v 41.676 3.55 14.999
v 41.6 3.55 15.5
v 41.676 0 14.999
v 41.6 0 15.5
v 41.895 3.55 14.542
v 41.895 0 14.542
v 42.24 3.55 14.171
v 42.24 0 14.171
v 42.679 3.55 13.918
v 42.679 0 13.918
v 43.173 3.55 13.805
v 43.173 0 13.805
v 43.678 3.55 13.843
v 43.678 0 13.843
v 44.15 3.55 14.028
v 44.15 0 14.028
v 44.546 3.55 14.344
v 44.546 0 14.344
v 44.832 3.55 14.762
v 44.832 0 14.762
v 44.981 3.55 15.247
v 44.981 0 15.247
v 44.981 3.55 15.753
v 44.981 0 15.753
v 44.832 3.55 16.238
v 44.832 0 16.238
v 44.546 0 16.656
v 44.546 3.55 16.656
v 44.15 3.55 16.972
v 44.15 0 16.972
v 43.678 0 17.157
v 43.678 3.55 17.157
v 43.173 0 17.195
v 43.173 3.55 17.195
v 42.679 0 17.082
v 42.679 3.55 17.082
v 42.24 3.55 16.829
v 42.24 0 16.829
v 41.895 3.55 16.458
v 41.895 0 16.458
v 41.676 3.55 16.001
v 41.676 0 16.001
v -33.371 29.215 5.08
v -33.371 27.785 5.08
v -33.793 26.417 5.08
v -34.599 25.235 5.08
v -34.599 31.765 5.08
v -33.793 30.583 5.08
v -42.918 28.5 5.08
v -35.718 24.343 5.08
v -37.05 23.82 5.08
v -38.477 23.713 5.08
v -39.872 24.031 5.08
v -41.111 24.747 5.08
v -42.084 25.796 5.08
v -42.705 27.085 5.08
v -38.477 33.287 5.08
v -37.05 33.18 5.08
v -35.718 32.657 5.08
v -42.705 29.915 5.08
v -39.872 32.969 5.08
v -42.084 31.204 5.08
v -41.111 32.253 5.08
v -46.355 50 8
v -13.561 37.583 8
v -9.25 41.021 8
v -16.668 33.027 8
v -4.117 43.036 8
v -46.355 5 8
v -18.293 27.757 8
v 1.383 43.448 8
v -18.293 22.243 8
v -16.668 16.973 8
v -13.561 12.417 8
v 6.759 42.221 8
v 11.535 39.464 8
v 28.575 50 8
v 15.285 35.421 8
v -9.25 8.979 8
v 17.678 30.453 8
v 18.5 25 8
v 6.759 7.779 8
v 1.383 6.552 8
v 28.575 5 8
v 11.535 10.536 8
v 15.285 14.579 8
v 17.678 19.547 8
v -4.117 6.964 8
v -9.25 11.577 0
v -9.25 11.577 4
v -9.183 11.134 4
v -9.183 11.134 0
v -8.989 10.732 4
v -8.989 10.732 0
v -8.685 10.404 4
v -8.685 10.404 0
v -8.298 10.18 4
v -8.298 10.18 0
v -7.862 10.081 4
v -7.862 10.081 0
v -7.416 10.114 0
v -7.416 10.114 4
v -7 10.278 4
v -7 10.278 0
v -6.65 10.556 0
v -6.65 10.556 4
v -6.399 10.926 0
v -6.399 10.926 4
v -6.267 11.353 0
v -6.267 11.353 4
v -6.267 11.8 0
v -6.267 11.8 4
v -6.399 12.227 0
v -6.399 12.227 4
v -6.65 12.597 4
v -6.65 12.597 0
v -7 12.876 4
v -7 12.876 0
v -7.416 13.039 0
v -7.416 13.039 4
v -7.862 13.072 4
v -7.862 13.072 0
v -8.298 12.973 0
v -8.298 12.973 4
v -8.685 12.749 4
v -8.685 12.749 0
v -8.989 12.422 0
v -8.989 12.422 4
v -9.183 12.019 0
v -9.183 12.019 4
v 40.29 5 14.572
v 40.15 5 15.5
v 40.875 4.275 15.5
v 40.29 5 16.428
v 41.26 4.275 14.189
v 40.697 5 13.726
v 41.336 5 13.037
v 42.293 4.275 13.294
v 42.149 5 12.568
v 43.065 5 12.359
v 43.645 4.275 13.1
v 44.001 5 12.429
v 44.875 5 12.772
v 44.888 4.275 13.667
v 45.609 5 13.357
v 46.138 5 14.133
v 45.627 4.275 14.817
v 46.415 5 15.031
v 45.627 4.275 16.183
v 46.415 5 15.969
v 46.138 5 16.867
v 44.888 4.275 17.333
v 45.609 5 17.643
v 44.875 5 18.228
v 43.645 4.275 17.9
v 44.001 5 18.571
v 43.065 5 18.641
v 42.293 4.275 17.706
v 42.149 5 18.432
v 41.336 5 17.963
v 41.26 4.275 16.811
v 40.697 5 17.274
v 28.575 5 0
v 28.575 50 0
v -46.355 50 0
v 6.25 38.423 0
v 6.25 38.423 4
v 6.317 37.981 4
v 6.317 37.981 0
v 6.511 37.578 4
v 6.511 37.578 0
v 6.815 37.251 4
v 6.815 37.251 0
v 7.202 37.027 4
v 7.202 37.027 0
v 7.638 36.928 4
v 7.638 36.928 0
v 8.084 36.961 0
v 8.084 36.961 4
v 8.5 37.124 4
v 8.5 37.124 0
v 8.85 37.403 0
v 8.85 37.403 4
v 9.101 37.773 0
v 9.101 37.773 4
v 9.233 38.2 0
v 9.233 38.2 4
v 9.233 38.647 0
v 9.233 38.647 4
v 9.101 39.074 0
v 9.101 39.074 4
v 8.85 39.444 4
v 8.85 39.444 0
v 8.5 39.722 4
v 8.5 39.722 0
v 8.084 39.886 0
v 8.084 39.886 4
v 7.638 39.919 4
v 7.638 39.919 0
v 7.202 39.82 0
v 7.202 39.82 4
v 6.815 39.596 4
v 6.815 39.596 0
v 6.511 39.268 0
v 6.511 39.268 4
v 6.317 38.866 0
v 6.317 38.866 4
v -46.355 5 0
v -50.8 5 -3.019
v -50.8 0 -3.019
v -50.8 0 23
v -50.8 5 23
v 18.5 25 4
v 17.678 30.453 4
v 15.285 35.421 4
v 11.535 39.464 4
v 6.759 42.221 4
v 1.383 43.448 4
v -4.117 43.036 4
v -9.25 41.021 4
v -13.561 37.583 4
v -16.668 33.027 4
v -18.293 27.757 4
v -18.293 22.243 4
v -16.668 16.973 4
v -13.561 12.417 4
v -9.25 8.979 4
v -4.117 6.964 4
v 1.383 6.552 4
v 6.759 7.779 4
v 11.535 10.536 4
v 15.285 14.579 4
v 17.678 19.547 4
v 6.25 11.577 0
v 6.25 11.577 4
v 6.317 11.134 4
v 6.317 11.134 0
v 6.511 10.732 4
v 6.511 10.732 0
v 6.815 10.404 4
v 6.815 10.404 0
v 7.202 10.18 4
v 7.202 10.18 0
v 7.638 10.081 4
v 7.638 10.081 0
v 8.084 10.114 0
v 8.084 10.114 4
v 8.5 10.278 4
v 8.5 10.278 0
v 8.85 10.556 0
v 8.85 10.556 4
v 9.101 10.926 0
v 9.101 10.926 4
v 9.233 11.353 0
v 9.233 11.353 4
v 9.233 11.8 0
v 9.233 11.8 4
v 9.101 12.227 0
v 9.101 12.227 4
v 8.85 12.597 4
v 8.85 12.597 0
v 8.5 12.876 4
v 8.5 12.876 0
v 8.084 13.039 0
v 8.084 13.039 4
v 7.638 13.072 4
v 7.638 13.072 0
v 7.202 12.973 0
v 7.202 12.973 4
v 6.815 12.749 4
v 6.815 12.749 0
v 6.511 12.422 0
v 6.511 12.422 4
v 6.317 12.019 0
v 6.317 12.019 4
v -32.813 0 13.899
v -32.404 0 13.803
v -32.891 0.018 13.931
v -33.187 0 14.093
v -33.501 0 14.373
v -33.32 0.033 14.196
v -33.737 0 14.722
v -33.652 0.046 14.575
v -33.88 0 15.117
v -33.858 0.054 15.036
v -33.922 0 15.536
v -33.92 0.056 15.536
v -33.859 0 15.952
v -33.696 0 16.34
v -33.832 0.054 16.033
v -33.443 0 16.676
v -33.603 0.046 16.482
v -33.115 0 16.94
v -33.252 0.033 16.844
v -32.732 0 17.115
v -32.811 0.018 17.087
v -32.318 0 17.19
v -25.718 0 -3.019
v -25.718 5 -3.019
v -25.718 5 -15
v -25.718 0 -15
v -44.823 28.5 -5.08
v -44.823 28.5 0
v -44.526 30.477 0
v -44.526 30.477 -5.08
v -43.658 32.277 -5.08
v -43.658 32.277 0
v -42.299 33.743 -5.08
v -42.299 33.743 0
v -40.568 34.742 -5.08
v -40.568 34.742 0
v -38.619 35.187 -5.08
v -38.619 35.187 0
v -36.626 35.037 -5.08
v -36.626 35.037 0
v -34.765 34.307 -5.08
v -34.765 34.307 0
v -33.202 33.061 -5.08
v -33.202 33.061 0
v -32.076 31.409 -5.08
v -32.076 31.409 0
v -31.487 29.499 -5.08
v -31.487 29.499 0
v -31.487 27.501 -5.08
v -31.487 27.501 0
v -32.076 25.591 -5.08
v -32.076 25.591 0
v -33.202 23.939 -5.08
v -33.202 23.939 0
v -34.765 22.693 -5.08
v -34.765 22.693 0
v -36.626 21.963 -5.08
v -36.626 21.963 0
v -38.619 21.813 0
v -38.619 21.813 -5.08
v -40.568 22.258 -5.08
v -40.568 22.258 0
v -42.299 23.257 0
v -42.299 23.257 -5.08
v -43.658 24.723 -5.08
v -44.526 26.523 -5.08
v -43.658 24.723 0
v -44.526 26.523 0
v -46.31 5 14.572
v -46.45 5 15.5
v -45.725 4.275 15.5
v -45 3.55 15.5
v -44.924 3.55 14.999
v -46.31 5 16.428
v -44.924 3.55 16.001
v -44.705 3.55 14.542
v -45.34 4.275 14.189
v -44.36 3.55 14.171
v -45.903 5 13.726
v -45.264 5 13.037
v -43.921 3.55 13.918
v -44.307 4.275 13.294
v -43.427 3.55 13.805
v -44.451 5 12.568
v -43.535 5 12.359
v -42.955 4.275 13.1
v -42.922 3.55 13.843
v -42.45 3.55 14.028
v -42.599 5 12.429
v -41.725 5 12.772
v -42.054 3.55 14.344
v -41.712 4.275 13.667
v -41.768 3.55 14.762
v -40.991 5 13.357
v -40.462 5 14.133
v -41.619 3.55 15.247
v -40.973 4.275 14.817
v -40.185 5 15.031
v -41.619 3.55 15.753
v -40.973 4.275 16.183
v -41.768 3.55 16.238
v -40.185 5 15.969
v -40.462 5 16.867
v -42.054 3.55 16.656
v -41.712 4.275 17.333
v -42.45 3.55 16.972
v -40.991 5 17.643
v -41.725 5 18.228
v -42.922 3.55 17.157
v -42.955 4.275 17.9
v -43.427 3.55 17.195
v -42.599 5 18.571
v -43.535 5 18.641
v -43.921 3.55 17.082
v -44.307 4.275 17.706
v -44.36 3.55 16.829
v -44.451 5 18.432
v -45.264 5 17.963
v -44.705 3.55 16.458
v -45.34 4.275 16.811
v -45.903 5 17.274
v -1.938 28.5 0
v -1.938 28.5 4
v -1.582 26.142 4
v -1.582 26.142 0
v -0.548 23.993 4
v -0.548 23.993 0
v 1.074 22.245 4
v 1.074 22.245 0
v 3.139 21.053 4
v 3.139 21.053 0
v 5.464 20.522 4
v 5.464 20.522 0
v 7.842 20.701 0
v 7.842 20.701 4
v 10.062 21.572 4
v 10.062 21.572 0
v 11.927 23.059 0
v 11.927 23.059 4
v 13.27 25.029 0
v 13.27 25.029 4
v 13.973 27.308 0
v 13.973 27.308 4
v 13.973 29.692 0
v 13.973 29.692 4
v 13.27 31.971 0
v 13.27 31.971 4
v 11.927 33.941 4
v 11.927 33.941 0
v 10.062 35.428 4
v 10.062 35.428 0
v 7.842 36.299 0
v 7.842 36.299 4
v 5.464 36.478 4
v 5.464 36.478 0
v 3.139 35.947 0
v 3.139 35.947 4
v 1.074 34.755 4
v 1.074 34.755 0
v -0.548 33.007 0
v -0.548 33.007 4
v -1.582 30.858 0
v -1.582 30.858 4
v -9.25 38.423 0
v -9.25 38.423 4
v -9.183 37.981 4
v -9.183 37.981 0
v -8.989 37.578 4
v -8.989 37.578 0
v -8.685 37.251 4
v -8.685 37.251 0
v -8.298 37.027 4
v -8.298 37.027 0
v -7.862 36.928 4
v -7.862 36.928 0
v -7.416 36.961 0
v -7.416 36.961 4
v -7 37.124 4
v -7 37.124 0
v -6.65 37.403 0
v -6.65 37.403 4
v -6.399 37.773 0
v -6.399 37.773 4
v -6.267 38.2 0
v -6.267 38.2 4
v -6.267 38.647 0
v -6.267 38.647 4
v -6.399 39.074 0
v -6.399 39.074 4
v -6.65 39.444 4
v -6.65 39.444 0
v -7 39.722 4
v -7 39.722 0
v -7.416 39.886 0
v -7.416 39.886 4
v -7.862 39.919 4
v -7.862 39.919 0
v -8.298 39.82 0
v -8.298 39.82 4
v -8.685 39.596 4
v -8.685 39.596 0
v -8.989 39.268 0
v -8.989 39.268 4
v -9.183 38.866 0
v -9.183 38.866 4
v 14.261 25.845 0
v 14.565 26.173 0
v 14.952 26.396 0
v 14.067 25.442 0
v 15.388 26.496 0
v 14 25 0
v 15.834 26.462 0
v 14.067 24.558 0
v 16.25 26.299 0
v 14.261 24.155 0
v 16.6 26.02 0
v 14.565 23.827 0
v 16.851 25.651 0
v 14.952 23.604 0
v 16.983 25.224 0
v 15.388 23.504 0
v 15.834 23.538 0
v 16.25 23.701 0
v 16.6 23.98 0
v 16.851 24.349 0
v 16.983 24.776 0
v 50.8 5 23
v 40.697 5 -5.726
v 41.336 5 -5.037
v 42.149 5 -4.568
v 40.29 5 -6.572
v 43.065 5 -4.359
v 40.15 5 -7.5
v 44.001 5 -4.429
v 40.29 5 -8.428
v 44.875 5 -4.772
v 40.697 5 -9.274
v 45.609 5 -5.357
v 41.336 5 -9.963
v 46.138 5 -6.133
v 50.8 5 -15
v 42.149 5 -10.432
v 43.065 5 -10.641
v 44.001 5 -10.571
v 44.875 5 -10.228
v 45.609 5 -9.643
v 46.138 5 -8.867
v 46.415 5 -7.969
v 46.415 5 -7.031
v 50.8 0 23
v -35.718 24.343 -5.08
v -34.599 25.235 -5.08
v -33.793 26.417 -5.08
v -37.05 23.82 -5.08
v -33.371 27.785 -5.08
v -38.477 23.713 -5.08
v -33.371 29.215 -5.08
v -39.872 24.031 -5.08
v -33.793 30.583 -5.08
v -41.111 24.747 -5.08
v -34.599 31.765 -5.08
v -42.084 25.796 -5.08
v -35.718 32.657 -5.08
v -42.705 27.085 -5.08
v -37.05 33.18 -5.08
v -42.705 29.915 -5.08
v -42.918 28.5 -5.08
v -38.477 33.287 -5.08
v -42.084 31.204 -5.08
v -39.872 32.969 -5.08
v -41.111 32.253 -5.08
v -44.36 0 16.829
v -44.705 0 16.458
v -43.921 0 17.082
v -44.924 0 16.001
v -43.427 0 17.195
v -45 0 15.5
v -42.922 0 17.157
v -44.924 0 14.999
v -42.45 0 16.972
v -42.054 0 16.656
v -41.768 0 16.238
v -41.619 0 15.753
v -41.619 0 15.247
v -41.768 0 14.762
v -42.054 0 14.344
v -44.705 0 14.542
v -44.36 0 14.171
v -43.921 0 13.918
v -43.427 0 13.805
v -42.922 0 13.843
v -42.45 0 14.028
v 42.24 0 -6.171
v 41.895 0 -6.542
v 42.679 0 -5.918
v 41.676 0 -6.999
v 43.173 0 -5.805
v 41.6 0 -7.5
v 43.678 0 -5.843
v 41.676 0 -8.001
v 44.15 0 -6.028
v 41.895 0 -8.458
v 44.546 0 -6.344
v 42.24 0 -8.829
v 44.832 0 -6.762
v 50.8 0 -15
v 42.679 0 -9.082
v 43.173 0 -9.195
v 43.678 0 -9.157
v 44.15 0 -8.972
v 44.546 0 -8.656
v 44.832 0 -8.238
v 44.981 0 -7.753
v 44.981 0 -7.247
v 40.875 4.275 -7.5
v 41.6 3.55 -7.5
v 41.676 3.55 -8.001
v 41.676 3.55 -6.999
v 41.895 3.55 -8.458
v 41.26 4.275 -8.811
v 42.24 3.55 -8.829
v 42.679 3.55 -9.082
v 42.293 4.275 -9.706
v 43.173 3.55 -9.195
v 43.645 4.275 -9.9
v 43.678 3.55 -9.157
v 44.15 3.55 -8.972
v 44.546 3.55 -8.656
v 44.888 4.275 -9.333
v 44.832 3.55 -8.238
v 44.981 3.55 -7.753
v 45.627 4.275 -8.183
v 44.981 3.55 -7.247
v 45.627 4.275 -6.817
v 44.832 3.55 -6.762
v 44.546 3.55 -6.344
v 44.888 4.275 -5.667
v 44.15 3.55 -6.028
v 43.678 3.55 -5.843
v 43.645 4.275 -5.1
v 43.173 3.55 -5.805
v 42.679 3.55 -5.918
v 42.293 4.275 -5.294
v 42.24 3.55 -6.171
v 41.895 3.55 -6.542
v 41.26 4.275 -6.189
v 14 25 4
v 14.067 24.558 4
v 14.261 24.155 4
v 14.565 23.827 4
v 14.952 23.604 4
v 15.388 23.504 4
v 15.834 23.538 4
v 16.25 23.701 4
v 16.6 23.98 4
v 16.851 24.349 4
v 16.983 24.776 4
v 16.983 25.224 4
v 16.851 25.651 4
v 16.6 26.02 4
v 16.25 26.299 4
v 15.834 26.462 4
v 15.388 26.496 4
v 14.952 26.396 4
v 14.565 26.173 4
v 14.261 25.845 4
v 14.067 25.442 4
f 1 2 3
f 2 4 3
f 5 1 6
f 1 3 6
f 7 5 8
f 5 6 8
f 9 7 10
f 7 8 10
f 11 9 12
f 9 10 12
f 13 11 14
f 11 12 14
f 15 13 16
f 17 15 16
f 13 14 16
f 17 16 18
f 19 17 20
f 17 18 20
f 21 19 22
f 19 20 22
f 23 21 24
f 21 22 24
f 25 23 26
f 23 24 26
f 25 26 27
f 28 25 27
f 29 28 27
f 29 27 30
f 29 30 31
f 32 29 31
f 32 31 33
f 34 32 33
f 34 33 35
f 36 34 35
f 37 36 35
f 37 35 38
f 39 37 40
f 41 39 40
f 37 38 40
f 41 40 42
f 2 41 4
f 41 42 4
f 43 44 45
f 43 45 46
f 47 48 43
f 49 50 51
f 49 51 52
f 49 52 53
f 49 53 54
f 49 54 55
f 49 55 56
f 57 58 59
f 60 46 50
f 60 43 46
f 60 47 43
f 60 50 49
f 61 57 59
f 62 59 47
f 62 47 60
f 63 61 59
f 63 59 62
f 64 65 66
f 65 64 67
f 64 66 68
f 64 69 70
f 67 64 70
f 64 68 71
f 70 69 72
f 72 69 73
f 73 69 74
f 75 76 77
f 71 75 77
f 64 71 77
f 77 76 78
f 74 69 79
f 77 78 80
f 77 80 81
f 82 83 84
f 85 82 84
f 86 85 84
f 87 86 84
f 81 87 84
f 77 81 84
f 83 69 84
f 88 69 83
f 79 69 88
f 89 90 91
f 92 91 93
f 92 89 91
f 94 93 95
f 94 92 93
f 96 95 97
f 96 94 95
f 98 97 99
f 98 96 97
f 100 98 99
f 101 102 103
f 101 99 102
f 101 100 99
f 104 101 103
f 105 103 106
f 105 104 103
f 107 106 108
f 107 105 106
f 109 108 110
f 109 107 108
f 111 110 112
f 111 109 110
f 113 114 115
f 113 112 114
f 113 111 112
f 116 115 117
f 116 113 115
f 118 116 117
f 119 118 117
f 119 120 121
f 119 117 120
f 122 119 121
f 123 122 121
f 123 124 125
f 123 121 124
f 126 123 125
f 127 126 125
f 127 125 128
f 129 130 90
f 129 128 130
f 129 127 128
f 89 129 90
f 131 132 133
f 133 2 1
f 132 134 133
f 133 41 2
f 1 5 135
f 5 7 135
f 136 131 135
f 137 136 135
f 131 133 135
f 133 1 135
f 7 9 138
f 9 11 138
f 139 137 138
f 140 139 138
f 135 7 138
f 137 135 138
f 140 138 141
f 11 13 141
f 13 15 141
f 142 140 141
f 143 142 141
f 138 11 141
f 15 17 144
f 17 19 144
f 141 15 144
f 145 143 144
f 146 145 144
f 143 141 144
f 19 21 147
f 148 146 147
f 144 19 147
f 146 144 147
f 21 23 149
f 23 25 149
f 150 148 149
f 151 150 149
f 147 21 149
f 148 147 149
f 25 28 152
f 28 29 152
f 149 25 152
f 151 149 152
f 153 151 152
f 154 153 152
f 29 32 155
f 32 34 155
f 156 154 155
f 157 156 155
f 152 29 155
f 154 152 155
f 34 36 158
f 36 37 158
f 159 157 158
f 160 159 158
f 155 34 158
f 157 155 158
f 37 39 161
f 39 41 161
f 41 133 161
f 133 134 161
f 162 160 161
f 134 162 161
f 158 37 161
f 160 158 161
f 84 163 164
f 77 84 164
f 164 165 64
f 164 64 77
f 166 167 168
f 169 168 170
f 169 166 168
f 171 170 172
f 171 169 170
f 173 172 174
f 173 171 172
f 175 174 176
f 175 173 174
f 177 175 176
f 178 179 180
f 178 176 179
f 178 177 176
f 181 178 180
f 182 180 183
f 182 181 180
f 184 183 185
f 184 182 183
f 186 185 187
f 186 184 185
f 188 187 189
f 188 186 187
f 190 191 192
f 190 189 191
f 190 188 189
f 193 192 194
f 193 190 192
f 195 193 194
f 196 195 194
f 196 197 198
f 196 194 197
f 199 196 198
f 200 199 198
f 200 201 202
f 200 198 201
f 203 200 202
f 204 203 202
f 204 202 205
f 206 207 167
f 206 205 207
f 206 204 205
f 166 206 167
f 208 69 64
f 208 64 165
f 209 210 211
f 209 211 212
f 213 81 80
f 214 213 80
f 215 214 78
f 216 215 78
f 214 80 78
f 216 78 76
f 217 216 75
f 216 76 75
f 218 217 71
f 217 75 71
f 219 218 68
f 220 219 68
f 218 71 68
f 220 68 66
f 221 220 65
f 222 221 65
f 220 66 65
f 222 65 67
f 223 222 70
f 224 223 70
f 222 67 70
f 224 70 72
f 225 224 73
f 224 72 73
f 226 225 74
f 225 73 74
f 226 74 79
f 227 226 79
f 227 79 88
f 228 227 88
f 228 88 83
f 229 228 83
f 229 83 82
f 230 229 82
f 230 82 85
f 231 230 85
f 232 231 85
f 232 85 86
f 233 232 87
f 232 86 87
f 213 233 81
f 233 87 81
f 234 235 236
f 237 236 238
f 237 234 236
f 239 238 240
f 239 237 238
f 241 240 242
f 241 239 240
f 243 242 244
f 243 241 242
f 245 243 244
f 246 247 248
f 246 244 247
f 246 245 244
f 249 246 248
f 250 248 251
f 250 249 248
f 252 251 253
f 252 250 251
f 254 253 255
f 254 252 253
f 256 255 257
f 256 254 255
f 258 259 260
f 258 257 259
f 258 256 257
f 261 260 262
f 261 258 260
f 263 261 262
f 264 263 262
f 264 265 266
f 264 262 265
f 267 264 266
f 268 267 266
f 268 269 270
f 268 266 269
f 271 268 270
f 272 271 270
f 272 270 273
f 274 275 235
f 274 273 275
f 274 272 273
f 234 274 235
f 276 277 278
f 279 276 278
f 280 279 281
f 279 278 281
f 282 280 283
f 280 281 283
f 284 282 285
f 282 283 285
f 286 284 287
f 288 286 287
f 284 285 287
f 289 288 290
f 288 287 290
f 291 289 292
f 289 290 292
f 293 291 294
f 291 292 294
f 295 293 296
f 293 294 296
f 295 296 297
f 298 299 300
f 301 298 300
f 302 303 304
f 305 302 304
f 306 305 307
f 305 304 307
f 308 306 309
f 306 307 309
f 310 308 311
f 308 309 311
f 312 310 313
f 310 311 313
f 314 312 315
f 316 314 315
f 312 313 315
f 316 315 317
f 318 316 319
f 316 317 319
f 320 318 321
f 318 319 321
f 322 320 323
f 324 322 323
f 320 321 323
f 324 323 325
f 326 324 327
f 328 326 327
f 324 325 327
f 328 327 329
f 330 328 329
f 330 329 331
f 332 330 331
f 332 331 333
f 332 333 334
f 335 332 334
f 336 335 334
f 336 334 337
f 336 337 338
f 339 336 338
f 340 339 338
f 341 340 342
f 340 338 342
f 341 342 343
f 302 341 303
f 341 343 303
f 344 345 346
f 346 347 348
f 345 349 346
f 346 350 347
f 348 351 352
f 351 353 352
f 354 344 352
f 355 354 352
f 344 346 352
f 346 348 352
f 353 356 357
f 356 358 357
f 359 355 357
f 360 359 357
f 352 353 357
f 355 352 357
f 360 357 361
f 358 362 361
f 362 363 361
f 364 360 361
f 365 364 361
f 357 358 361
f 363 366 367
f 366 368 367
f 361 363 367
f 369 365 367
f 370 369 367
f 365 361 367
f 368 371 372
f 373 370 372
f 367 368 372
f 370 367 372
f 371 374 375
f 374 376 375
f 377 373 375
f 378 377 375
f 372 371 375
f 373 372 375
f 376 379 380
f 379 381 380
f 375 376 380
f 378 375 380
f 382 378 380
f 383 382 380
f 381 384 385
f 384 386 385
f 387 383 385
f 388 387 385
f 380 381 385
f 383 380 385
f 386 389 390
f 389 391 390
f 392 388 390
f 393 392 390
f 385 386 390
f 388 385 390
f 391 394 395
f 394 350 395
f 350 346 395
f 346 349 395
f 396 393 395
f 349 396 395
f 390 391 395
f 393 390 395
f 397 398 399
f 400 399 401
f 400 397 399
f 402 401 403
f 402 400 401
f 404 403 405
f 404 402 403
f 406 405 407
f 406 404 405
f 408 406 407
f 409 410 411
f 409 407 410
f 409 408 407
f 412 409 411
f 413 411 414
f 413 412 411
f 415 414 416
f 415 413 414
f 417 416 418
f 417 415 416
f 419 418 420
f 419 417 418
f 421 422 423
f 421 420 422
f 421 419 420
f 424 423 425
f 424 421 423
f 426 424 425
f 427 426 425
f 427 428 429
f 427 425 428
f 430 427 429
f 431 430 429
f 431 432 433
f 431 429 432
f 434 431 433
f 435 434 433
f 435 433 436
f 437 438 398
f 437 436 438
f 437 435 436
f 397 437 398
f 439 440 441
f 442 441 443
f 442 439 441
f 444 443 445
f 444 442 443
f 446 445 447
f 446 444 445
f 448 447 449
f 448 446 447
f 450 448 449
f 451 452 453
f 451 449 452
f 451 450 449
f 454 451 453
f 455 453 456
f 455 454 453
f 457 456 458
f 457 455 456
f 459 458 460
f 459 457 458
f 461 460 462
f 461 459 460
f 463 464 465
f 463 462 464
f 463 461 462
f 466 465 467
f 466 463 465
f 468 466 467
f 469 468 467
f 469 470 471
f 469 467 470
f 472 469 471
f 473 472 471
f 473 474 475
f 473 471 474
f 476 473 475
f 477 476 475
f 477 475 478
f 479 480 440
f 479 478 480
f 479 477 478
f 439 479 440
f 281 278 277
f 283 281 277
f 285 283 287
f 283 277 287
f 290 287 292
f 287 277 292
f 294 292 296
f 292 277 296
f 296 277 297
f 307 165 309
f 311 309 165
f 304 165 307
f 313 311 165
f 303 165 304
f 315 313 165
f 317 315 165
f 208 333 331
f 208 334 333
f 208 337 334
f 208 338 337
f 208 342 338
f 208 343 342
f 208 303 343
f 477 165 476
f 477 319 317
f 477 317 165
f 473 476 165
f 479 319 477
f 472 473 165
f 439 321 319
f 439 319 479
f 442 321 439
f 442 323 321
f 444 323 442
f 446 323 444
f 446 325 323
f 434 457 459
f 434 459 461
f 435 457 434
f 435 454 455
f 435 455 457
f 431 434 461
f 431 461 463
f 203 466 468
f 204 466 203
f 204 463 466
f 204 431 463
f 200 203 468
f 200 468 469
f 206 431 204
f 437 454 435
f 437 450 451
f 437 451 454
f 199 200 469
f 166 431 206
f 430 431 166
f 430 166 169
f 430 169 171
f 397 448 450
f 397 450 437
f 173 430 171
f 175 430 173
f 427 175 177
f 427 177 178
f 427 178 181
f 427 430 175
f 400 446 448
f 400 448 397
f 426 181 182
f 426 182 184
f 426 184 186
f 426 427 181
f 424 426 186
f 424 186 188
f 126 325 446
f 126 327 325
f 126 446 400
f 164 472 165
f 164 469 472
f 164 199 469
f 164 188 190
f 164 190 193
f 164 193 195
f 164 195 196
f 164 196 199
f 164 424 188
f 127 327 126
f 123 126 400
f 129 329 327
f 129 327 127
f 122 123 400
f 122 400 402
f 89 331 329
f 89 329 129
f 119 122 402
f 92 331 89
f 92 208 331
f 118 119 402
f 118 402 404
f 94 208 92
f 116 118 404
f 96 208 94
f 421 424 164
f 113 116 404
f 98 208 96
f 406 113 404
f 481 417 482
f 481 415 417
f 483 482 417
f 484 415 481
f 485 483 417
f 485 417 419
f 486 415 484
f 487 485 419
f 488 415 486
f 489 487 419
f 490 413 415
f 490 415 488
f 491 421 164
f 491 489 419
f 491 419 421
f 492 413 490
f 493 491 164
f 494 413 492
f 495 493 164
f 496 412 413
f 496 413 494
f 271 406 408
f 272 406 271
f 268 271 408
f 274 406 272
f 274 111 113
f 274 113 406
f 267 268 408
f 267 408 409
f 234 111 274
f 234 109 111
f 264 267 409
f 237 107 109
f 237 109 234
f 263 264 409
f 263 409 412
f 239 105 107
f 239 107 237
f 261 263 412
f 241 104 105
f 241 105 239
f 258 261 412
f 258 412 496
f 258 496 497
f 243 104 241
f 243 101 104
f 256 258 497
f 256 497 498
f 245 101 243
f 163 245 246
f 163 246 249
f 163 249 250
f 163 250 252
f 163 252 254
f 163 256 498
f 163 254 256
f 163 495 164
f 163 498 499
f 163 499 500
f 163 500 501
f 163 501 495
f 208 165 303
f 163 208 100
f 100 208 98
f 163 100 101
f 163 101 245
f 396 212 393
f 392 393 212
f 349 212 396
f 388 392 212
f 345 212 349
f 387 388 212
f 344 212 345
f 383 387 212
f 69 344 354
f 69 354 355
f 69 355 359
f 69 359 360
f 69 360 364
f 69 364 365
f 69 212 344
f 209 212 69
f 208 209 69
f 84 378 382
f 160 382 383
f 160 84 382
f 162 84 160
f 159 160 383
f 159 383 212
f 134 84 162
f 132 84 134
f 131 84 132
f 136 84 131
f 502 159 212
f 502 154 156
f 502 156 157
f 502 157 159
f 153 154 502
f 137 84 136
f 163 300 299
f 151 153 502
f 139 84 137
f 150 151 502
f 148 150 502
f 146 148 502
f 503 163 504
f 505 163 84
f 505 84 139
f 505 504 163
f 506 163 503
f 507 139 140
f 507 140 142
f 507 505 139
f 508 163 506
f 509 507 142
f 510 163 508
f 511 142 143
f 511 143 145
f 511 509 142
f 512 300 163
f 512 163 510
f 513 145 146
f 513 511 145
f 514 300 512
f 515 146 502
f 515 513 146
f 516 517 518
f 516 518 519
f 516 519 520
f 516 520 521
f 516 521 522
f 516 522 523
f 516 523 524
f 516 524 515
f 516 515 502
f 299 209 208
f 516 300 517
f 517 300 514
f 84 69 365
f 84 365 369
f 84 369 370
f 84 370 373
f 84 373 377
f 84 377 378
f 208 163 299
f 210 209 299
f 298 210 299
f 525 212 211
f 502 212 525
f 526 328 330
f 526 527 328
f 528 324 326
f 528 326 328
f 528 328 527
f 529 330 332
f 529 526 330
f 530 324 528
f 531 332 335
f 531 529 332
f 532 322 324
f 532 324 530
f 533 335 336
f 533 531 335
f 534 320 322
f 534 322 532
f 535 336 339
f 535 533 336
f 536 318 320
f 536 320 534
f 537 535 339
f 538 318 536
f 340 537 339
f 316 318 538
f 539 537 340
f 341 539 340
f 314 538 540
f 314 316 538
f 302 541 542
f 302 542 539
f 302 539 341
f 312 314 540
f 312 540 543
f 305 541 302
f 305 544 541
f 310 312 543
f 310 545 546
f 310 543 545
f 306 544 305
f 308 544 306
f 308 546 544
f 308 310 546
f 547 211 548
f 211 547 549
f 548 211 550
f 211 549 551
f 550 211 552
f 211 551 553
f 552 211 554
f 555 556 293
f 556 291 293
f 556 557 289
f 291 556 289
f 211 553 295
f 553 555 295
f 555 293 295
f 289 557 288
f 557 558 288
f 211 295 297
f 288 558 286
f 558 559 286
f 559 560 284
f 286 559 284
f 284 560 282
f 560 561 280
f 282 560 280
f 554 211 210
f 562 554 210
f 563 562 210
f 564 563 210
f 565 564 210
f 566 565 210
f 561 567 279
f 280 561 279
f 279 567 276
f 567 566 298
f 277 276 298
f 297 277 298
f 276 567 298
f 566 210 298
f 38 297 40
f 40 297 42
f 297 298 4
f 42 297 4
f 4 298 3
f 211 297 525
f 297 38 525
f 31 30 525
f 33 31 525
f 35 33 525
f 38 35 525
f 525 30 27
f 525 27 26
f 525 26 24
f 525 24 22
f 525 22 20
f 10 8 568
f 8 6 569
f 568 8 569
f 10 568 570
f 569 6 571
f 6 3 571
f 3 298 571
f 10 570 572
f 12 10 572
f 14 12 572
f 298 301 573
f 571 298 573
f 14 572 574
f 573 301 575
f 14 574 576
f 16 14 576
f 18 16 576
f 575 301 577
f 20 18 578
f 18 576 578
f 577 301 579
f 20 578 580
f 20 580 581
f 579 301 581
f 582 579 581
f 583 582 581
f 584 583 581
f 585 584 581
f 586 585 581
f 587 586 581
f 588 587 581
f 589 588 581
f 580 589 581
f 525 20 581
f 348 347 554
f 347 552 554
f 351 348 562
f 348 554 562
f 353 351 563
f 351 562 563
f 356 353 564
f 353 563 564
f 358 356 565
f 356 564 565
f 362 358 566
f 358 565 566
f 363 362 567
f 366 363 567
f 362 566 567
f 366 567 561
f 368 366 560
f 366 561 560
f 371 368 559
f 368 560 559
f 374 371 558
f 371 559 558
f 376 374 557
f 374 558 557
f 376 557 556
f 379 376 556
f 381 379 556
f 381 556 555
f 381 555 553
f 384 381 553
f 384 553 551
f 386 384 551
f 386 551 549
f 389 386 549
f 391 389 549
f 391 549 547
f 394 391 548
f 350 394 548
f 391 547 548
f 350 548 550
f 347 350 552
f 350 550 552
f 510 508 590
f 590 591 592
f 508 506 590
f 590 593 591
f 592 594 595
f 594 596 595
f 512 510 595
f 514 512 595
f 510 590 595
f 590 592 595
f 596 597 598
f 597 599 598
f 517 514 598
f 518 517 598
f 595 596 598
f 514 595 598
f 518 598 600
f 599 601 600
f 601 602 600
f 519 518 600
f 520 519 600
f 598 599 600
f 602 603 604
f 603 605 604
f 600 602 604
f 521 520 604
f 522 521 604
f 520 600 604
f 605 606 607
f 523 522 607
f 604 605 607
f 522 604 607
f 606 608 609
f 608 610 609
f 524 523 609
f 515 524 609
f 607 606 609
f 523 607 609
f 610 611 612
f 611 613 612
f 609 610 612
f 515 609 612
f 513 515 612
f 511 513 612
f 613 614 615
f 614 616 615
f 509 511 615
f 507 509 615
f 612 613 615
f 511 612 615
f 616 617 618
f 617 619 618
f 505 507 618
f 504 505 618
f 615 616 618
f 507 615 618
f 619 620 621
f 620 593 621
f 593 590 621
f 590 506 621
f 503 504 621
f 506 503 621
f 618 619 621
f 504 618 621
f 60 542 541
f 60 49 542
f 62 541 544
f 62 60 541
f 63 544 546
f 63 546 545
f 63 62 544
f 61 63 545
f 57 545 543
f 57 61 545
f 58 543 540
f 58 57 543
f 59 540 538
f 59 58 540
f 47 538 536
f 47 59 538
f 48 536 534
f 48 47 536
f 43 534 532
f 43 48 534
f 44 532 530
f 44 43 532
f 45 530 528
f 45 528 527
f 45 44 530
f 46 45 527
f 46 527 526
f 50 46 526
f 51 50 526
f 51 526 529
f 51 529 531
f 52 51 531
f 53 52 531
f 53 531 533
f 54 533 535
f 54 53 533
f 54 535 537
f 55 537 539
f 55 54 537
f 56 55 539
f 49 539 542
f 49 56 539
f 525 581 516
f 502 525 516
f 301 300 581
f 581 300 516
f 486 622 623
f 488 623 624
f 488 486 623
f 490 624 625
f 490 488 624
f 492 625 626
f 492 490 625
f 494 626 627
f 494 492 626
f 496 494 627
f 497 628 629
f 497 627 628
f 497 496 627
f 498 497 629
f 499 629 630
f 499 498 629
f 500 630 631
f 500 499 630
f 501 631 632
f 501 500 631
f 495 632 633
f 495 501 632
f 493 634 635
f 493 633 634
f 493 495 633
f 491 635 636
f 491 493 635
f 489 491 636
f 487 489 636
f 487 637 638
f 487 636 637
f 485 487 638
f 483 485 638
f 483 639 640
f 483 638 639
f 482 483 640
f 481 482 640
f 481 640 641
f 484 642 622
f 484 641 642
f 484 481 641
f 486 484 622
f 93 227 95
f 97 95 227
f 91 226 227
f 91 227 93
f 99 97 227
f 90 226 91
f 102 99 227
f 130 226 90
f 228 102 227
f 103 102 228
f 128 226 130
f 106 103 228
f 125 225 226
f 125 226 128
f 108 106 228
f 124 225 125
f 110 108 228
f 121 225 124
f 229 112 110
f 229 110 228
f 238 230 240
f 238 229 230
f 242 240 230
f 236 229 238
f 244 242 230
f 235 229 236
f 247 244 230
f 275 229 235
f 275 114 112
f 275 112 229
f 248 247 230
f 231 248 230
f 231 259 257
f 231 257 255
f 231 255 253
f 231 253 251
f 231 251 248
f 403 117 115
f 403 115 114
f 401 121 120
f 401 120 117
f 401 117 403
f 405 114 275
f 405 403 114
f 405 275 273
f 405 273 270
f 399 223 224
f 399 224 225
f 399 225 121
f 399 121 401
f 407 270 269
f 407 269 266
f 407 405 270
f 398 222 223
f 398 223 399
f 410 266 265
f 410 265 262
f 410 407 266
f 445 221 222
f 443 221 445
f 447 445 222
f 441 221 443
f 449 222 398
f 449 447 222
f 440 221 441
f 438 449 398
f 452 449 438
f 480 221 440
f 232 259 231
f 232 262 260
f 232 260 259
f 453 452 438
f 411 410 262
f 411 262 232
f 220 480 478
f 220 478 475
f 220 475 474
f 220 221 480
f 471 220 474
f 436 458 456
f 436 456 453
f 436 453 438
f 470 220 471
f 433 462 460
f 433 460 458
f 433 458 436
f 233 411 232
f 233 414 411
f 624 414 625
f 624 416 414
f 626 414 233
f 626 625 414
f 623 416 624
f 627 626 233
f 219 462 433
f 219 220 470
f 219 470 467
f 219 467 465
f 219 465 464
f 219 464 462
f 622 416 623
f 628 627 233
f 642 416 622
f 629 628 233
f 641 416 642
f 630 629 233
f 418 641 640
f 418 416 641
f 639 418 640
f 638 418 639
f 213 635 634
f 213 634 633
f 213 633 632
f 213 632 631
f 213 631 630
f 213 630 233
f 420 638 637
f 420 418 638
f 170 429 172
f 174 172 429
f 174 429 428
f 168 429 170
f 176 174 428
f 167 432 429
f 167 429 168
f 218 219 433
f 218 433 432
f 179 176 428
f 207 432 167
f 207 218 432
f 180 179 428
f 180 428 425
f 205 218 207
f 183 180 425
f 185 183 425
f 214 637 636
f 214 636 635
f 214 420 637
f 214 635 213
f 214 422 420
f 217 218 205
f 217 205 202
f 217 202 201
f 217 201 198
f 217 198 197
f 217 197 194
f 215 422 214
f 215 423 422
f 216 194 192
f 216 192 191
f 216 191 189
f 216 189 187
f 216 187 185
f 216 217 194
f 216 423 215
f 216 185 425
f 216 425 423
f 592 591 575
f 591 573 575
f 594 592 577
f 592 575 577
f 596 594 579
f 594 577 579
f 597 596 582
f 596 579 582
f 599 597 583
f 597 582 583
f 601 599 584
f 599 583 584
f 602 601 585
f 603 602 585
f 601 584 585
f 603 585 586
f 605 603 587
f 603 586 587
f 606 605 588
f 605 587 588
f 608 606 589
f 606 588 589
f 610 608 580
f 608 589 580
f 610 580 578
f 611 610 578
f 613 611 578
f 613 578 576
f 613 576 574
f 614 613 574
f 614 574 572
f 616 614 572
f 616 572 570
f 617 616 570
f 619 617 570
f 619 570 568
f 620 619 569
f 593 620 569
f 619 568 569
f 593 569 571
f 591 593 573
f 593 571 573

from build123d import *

# Parameters (mm, degrees)
SKETCH3_W                                       = 57.15
SKETCH3_H                                       = 50
BOSS_EXTRUDE1_DEPTH                             = 8
SKETCH3_3_R                                     = 1.5
SKETCH3_3_R_2                                   = 8
CUT_EXTRUDE2_DEPTH                              = 10
SKETCH4_R                                       = 18.5
CUT_EXTRUDE3_DEPTH                              = 4
BOSS_EXTRUDE2_DEPTH                             = 15
BOSS_EXTRUDE2_DEPTH_BACK                        = 23
SKETCH6_W                                       = 101.6
SKETCH6_H                                       = 5
CSK_FOR_M3_FLAT_HEAD_MACHINE_SCREW1_D           = 3.4
CSK_FOR_M3_FLAT_HEAD_MACHINE_SCREW1_CSINK_D     = 6.3
CSK_FOR_M3_FLAT_HEAD_MACHINE_SCREW1_CSINK_ANGLE = 90
CUT_EXTRUDE6_REACH                              = 555.432
SKETCH16_R                                      = 1.7
CUT_EXTRUDE7_REACH                              = 73.656
SKETCH17_W                                      = 25.08228791
SKETCH17_H                                      = 11.980848154
SKETCH18_W                                      = 17.78
SKETCH18_H                                      = 8
BOSS_EXTRUDE3_DEPTH                             = 45
SKETCH13_R                                      = 6.7056
SKETCH13_R_2                                    = 4.8006
BOSS_EXTRUDE4_DEPTH                             = 5.08
CUT_EXTRUDE8_START                              = -5.08
SKETCH19_R                                      = 4.8006
CUT_EXTRUDE8_DEPTH                              = 5.08


with BuildPart() as part:
    # Sketch3 → Boss-Extrude1 (new body)
    with BuildSketch(Plane.XY):
        with Locations((0, 25)):
            Rectangle(SKETCH3_W, SKETCH3_H)
    extrude(amount=BOSS_EXTRUDE1_DEPTH)

    # Sketch3<3> → Cut-Extrude2 (cut)
    with BuildSketch(Plane.XY):
        with Locations(Location((-7.75, 38.423393759, 0), (0, 0, 180))):
            Circle(SKETCH3_3_R)
        with Locations(Location((7.75, 38.423393759, 0), (0, 0, 180))):
            Circle(SKETCH3_3_R)
        with Locations(Location((-7.75, 11.576606241, 0), (0, 0, 180))):
            Circle(SKETCH3_3_R)
        with Locations(Location((7.75, 11.576606241, 0), (0, 0, 180))):
            Circle(SKETCH3_3_R)
        with Locations(Location((15.5, 25, 0), (0, 0, 180))):
            Circle(SKETCH3_3_R)
        with Locations(Location((6.062177825, 28.499999999, 0), (0, 0, 180))):
            Circle(SKETCH3_3_R_2)
    extrude(amount=CUT_EXTRUDE2_DEPTH, mode=Mode.SUBTRACT)

    # Sketch4 → Cut-Extrude3 (cut)
    with BuildSketch(Plane.XY.offset(8)):
        with Locations((0, 25)):
            Circle(SKETCH4_R)
    extrude(amount=-CUT_EXTRUDE3_DEPTH, mode=Mode.SUBTRACT)

    # Sketch6 → Boss-Extrude2 (add, two sides: drawn at the far end of the back side and taken through both)
    with BuildSketch(Plane.XY.offset(8).offset(-BOSS_EXTRUDE2_DEPTH_BACK)):
        with Locations((0, 2.5)):
            Rectangle(SKETCH6_W, SKETCH6_H)
    extrude(amount=BOSS_EXTRUDE2_DEPTH + BOSS_EXTRUDE2_DEPTH_BACK)

    # CSK for M3 Flat Head Machine Screw1 (through all)
    with Locations(Plane(origin=(0, 5, 0), x_dir=(1, 0, 0), z_dir=(0, 1, 0))):
        with Locations((-43.3, 7.5), (-43.3, -15.5), (43.3, -15.5), (43.3, 7.5)):
            CounterSinkHole(CSK_FOR_M3_FLAT_HEAD_MACHINE_SCREW1_D / 2, CSK_FOR_M3_FLAT_HEAD_MACHINE_SCREW1_CSINK_D / 2, counter_sink_angle=CSK_FOR_M3_FLAT_HEAD_MACHINE_SCREW1_CSINK_ANGLE)

    # Sketch16 → Cut-Extrude6 (cut, up to next)
    with BuildSketch(Plane(origin=(-499.248949842, 16.821159134, -28.308871479), x_dir=(0.050830850863696445, -0.0009181581696577921, 0.9987068546806156), z_dir=(0.036090886531912156, 0.9993480899541041, -0.0009181581696584951)), mode=Mode.PRIVATE) as cut_extrude6_sk1:
        with Locations((67.5, 464.499999998)):
            Circle(SKETCH16_R)
    cut_extrude6_tool1 = extrude(cut_extrude6_sk1.sketch, amount=-CUT_EXTRUDE6_REACH, mode=Mode.PRIVATE) & part.part
    # Sketch16 → Cut-Extrude6 (cut, up to next)
    with BuildSketch(Plane(origin=(-499.248949842, 16.821159134, -28.308871479), x_dir=(0.050830850863696445, -0.0009181581696577921, 0.9987068546806156), z_dir=(0.036090886531912156, 0.9993480899541041, -0.0009181581696584951)), mode=Mode.PRIVATE) as cut_extrude6_sk2:
        with Locations((44.5, 464.499999998)):
            Circle(SKETCH16_R)
    cut_extrude6_tool2 = extrude(cut_extrude6_sk2.sketch, amount=-CUT_EXTRUDE6_REACH, mode=Mode.PRIVATE) & part.part
    add(cut_extrude6_tool1.solids().sort_by_distance((-32.221346, -0.005033, 15.492911))[0], mode=Mode.SUBTRACT)
    add(cut_extrude6_tool2.solids().sort_by_distance((-33.390455, 0.016084, -7.477347))[0], mode=Mode.SUBTRACT)

    # Sketch17 → Cut-Extrude7 (cut, up to next)
    with BuildSketch(Plane(origin=(0, 5, 0), x_dir=(1, 0, 0), z_dir=(0, 1, 0)), mode=Mode.PRIVATE) as cut_extrude7_sk1:
        with Locations((-38.258856045, 9.009575923)):
            Rectangle(SKETCH17_W, SKETCH17_H)
    cut_extrude7_tool1 = extrude(cut_extrude7_sk1.sketch, amount=-CUT_EXTRUDE7_REACH, mode=Mode.PRIVATE) & part.part
    add(cut_extrude7_tool1.solids().sort_by_distance((-38.258856, 5, -9.009576))[0], mode=Mode.SUBTRACT)

    # Sketch18 → Boss-Extrude3 (add)
    with BuildSketch(Plane(origin=(0, 5, 0), x_dir=(1, 0, 0), z_dir=(0, 1, 0))):
        with Locations((-37.465, -4)):
            Rectangle(SKETCH18_W, SKETCH18_H)
    extrude(amount=BOSS_EXTRUDE3_DEPTH)

    # Sketch13 → Boss-Extrude4 (add)
    with BuildSketch(Plane(origin=(0, 0, 0), x_dir=(-1, 0, 0), z_dir=(0, 0, -1))):
        with Locations((38.117822207, 28.499999999)):
            Circle(SKETCH13_R)
        with Locations((38.117822207, 28.499999999)):
            Circle(SKETCH13_R_2, mode=Mode.SUBTRACT)
    extrude(amount=BOSS_EXTRUDE4_DEPTH)

    # Sketch19 → Cut-Extrude8 (cut)
    with BuildSketch(Plane(origin=(0, 0, 0), x_dir=(-1, 0, 0), z_dir=(0, 0, -1)).offset(CUT_EXTRUDE8_START)):
        with Locations((38.117822207, 28.499999999)):
            Circle(SKETCH19_R)
    extrude(amount=CUT_EXTRUDE8_DEPTH, mode=Mode.SUBTRACT)


solid = part.part
